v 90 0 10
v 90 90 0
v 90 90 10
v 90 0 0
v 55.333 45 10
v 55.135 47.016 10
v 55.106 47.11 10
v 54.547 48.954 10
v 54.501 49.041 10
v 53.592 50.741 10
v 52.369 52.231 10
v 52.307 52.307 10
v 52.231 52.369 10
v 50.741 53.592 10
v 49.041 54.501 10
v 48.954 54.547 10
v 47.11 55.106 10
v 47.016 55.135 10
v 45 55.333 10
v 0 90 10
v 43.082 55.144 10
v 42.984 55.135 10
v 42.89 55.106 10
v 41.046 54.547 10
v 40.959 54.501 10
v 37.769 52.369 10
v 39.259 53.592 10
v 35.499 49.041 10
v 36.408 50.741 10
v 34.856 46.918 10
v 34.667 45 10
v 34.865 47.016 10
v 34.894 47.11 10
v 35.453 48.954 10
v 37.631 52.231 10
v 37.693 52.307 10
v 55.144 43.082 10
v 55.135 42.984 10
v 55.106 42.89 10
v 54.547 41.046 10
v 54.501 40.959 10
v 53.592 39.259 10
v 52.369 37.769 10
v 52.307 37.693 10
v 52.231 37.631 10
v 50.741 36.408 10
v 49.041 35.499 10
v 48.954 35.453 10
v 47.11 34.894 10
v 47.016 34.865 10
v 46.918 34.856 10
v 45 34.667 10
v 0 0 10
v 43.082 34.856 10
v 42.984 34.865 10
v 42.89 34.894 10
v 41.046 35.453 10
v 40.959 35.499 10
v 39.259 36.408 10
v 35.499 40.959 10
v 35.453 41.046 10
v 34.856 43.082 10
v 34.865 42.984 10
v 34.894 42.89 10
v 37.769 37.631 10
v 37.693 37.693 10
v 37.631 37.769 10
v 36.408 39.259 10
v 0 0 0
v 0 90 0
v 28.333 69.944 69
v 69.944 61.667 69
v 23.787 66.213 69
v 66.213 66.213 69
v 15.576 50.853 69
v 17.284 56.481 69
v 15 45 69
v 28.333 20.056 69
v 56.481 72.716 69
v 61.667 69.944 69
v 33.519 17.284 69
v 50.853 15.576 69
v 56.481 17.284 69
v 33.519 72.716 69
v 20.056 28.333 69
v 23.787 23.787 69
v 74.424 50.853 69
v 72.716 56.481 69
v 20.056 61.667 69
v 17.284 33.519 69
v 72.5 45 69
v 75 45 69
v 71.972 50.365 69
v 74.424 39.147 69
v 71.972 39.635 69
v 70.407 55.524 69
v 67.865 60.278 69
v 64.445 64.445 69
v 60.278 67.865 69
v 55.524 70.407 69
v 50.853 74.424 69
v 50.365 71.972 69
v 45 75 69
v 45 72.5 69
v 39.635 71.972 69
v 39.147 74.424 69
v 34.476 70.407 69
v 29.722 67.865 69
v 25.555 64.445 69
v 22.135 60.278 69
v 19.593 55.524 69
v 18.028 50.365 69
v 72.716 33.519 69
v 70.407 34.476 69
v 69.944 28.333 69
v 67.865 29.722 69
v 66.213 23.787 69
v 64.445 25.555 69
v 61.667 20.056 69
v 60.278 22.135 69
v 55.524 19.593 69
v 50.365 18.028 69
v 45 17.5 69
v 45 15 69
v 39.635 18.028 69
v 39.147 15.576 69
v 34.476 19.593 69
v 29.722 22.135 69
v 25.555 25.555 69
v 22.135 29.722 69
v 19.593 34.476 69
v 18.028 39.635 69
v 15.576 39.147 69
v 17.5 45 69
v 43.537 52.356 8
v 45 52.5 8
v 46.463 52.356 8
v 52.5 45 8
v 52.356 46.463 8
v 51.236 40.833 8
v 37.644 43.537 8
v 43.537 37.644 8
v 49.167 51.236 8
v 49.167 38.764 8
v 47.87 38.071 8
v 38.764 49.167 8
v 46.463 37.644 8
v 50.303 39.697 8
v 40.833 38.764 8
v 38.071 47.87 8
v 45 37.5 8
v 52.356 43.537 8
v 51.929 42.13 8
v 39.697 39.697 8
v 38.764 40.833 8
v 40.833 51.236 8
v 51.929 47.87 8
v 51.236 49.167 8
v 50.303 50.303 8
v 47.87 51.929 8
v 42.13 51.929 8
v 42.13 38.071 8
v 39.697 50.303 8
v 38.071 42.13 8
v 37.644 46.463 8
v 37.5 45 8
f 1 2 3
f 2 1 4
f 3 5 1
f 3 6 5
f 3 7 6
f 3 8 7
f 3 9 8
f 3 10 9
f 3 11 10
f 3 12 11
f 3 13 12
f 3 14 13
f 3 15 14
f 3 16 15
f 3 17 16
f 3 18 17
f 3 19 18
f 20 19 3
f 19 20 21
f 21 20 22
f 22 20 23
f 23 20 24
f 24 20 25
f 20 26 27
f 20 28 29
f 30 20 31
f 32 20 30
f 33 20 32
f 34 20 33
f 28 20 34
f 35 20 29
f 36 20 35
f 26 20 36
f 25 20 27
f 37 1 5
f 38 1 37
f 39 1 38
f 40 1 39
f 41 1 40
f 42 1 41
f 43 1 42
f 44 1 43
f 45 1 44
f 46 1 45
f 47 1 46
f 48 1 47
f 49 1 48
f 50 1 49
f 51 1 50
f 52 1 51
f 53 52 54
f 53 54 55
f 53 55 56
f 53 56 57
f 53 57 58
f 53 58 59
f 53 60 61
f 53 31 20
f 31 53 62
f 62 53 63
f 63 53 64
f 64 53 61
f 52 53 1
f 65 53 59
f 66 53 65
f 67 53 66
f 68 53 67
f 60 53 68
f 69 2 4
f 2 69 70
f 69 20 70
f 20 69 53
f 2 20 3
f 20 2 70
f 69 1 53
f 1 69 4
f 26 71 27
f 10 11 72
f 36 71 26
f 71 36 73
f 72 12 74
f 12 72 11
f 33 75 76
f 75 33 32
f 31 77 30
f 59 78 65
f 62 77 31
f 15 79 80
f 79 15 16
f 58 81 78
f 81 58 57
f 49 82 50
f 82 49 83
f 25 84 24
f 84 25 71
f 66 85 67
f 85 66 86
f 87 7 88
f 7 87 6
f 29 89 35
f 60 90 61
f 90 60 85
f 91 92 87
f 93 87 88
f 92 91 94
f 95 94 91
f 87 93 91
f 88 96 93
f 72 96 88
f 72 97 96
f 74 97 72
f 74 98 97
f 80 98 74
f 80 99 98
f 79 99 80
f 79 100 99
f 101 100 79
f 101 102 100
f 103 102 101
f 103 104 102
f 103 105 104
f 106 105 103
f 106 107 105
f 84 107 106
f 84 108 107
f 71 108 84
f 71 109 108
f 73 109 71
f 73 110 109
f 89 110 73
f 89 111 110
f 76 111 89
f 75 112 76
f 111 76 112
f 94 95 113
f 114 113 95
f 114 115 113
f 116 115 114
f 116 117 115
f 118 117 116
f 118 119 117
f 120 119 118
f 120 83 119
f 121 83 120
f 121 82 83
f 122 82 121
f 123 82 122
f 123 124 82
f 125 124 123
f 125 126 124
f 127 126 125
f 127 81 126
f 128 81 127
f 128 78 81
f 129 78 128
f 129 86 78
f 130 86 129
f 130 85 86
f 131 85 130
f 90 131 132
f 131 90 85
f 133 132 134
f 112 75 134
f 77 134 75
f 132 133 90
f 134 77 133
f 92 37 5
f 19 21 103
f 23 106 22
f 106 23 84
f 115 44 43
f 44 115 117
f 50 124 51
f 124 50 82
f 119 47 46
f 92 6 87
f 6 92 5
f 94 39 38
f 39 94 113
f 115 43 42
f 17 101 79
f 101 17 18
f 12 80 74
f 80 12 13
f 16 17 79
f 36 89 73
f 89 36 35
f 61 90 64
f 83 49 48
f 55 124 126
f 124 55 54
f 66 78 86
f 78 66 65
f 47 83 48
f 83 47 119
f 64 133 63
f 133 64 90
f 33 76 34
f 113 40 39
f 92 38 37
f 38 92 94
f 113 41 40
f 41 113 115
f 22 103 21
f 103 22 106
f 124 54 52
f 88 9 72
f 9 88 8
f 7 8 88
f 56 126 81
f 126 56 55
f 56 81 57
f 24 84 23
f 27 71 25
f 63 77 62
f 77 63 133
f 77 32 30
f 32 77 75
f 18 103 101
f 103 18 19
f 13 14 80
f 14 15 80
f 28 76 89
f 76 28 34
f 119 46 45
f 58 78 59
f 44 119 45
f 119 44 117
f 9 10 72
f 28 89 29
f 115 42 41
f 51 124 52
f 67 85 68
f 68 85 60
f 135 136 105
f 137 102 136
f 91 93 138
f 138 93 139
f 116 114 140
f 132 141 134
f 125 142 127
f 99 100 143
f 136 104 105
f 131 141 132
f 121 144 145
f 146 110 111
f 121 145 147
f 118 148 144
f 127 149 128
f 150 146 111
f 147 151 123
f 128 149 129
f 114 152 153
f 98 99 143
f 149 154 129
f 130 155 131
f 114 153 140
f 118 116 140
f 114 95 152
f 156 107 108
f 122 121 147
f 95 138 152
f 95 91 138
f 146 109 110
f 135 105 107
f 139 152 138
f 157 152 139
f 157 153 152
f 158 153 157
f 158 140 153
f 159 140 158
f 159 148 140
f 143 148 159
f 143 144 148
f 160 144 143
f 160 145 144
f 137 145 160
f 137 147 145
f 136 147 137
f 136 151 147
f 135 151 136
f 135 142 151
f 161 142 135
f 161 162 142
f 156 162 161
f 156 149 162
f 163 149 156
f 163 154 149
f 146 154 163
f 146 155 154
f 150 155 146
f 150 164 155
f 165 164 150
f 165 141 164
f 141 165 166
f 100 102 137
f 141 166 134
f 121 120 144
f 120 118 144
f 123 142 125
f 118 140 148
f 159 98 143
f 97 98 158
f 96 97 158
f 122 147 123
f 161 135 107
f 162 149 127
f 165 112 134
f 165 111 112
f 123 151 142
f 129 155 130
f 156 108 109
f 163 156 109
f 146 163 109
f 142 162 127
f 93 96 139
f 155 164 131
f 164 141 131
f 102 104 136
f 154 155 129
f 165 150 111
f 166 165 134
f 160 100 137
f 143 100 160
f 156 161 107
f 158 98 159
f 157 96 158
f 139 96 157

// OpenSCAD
$fn = 32;

// ----------------------------------------------------------------------
// Hopper: funnel with square flange
// ----------------------------------------------------------------------

// --- parameters (mm) ---
fl = 90;                  // flange side, X and Y
fl_t = 10;                // flange thickness
cone_h = 60;              // cone height above the flange
top_d = 60;               // cone mouth diameter
bot_d = 20;               // cone spout diameter
wall = 2.5;               // cone wall thickness

bore_d = bot_d - 2 * wall;  // spout bore diameter
total_h = fl_t + cone_h - 1;  // overall height

difference() {
  union() {
    cube([fl, fl, fl_t]);
    translate([fl / 2, fl / 2, fl_t - 1])
      cylinder(h = cone_h, d1 = bot_d, d2 = top_d);
  }
  translate([fl / 2, fl / 2, fl_t - 2])
    cylinder(h = cone_h + 1, d1 = bore_d, d2 = top_d - 2 * wall);
}
